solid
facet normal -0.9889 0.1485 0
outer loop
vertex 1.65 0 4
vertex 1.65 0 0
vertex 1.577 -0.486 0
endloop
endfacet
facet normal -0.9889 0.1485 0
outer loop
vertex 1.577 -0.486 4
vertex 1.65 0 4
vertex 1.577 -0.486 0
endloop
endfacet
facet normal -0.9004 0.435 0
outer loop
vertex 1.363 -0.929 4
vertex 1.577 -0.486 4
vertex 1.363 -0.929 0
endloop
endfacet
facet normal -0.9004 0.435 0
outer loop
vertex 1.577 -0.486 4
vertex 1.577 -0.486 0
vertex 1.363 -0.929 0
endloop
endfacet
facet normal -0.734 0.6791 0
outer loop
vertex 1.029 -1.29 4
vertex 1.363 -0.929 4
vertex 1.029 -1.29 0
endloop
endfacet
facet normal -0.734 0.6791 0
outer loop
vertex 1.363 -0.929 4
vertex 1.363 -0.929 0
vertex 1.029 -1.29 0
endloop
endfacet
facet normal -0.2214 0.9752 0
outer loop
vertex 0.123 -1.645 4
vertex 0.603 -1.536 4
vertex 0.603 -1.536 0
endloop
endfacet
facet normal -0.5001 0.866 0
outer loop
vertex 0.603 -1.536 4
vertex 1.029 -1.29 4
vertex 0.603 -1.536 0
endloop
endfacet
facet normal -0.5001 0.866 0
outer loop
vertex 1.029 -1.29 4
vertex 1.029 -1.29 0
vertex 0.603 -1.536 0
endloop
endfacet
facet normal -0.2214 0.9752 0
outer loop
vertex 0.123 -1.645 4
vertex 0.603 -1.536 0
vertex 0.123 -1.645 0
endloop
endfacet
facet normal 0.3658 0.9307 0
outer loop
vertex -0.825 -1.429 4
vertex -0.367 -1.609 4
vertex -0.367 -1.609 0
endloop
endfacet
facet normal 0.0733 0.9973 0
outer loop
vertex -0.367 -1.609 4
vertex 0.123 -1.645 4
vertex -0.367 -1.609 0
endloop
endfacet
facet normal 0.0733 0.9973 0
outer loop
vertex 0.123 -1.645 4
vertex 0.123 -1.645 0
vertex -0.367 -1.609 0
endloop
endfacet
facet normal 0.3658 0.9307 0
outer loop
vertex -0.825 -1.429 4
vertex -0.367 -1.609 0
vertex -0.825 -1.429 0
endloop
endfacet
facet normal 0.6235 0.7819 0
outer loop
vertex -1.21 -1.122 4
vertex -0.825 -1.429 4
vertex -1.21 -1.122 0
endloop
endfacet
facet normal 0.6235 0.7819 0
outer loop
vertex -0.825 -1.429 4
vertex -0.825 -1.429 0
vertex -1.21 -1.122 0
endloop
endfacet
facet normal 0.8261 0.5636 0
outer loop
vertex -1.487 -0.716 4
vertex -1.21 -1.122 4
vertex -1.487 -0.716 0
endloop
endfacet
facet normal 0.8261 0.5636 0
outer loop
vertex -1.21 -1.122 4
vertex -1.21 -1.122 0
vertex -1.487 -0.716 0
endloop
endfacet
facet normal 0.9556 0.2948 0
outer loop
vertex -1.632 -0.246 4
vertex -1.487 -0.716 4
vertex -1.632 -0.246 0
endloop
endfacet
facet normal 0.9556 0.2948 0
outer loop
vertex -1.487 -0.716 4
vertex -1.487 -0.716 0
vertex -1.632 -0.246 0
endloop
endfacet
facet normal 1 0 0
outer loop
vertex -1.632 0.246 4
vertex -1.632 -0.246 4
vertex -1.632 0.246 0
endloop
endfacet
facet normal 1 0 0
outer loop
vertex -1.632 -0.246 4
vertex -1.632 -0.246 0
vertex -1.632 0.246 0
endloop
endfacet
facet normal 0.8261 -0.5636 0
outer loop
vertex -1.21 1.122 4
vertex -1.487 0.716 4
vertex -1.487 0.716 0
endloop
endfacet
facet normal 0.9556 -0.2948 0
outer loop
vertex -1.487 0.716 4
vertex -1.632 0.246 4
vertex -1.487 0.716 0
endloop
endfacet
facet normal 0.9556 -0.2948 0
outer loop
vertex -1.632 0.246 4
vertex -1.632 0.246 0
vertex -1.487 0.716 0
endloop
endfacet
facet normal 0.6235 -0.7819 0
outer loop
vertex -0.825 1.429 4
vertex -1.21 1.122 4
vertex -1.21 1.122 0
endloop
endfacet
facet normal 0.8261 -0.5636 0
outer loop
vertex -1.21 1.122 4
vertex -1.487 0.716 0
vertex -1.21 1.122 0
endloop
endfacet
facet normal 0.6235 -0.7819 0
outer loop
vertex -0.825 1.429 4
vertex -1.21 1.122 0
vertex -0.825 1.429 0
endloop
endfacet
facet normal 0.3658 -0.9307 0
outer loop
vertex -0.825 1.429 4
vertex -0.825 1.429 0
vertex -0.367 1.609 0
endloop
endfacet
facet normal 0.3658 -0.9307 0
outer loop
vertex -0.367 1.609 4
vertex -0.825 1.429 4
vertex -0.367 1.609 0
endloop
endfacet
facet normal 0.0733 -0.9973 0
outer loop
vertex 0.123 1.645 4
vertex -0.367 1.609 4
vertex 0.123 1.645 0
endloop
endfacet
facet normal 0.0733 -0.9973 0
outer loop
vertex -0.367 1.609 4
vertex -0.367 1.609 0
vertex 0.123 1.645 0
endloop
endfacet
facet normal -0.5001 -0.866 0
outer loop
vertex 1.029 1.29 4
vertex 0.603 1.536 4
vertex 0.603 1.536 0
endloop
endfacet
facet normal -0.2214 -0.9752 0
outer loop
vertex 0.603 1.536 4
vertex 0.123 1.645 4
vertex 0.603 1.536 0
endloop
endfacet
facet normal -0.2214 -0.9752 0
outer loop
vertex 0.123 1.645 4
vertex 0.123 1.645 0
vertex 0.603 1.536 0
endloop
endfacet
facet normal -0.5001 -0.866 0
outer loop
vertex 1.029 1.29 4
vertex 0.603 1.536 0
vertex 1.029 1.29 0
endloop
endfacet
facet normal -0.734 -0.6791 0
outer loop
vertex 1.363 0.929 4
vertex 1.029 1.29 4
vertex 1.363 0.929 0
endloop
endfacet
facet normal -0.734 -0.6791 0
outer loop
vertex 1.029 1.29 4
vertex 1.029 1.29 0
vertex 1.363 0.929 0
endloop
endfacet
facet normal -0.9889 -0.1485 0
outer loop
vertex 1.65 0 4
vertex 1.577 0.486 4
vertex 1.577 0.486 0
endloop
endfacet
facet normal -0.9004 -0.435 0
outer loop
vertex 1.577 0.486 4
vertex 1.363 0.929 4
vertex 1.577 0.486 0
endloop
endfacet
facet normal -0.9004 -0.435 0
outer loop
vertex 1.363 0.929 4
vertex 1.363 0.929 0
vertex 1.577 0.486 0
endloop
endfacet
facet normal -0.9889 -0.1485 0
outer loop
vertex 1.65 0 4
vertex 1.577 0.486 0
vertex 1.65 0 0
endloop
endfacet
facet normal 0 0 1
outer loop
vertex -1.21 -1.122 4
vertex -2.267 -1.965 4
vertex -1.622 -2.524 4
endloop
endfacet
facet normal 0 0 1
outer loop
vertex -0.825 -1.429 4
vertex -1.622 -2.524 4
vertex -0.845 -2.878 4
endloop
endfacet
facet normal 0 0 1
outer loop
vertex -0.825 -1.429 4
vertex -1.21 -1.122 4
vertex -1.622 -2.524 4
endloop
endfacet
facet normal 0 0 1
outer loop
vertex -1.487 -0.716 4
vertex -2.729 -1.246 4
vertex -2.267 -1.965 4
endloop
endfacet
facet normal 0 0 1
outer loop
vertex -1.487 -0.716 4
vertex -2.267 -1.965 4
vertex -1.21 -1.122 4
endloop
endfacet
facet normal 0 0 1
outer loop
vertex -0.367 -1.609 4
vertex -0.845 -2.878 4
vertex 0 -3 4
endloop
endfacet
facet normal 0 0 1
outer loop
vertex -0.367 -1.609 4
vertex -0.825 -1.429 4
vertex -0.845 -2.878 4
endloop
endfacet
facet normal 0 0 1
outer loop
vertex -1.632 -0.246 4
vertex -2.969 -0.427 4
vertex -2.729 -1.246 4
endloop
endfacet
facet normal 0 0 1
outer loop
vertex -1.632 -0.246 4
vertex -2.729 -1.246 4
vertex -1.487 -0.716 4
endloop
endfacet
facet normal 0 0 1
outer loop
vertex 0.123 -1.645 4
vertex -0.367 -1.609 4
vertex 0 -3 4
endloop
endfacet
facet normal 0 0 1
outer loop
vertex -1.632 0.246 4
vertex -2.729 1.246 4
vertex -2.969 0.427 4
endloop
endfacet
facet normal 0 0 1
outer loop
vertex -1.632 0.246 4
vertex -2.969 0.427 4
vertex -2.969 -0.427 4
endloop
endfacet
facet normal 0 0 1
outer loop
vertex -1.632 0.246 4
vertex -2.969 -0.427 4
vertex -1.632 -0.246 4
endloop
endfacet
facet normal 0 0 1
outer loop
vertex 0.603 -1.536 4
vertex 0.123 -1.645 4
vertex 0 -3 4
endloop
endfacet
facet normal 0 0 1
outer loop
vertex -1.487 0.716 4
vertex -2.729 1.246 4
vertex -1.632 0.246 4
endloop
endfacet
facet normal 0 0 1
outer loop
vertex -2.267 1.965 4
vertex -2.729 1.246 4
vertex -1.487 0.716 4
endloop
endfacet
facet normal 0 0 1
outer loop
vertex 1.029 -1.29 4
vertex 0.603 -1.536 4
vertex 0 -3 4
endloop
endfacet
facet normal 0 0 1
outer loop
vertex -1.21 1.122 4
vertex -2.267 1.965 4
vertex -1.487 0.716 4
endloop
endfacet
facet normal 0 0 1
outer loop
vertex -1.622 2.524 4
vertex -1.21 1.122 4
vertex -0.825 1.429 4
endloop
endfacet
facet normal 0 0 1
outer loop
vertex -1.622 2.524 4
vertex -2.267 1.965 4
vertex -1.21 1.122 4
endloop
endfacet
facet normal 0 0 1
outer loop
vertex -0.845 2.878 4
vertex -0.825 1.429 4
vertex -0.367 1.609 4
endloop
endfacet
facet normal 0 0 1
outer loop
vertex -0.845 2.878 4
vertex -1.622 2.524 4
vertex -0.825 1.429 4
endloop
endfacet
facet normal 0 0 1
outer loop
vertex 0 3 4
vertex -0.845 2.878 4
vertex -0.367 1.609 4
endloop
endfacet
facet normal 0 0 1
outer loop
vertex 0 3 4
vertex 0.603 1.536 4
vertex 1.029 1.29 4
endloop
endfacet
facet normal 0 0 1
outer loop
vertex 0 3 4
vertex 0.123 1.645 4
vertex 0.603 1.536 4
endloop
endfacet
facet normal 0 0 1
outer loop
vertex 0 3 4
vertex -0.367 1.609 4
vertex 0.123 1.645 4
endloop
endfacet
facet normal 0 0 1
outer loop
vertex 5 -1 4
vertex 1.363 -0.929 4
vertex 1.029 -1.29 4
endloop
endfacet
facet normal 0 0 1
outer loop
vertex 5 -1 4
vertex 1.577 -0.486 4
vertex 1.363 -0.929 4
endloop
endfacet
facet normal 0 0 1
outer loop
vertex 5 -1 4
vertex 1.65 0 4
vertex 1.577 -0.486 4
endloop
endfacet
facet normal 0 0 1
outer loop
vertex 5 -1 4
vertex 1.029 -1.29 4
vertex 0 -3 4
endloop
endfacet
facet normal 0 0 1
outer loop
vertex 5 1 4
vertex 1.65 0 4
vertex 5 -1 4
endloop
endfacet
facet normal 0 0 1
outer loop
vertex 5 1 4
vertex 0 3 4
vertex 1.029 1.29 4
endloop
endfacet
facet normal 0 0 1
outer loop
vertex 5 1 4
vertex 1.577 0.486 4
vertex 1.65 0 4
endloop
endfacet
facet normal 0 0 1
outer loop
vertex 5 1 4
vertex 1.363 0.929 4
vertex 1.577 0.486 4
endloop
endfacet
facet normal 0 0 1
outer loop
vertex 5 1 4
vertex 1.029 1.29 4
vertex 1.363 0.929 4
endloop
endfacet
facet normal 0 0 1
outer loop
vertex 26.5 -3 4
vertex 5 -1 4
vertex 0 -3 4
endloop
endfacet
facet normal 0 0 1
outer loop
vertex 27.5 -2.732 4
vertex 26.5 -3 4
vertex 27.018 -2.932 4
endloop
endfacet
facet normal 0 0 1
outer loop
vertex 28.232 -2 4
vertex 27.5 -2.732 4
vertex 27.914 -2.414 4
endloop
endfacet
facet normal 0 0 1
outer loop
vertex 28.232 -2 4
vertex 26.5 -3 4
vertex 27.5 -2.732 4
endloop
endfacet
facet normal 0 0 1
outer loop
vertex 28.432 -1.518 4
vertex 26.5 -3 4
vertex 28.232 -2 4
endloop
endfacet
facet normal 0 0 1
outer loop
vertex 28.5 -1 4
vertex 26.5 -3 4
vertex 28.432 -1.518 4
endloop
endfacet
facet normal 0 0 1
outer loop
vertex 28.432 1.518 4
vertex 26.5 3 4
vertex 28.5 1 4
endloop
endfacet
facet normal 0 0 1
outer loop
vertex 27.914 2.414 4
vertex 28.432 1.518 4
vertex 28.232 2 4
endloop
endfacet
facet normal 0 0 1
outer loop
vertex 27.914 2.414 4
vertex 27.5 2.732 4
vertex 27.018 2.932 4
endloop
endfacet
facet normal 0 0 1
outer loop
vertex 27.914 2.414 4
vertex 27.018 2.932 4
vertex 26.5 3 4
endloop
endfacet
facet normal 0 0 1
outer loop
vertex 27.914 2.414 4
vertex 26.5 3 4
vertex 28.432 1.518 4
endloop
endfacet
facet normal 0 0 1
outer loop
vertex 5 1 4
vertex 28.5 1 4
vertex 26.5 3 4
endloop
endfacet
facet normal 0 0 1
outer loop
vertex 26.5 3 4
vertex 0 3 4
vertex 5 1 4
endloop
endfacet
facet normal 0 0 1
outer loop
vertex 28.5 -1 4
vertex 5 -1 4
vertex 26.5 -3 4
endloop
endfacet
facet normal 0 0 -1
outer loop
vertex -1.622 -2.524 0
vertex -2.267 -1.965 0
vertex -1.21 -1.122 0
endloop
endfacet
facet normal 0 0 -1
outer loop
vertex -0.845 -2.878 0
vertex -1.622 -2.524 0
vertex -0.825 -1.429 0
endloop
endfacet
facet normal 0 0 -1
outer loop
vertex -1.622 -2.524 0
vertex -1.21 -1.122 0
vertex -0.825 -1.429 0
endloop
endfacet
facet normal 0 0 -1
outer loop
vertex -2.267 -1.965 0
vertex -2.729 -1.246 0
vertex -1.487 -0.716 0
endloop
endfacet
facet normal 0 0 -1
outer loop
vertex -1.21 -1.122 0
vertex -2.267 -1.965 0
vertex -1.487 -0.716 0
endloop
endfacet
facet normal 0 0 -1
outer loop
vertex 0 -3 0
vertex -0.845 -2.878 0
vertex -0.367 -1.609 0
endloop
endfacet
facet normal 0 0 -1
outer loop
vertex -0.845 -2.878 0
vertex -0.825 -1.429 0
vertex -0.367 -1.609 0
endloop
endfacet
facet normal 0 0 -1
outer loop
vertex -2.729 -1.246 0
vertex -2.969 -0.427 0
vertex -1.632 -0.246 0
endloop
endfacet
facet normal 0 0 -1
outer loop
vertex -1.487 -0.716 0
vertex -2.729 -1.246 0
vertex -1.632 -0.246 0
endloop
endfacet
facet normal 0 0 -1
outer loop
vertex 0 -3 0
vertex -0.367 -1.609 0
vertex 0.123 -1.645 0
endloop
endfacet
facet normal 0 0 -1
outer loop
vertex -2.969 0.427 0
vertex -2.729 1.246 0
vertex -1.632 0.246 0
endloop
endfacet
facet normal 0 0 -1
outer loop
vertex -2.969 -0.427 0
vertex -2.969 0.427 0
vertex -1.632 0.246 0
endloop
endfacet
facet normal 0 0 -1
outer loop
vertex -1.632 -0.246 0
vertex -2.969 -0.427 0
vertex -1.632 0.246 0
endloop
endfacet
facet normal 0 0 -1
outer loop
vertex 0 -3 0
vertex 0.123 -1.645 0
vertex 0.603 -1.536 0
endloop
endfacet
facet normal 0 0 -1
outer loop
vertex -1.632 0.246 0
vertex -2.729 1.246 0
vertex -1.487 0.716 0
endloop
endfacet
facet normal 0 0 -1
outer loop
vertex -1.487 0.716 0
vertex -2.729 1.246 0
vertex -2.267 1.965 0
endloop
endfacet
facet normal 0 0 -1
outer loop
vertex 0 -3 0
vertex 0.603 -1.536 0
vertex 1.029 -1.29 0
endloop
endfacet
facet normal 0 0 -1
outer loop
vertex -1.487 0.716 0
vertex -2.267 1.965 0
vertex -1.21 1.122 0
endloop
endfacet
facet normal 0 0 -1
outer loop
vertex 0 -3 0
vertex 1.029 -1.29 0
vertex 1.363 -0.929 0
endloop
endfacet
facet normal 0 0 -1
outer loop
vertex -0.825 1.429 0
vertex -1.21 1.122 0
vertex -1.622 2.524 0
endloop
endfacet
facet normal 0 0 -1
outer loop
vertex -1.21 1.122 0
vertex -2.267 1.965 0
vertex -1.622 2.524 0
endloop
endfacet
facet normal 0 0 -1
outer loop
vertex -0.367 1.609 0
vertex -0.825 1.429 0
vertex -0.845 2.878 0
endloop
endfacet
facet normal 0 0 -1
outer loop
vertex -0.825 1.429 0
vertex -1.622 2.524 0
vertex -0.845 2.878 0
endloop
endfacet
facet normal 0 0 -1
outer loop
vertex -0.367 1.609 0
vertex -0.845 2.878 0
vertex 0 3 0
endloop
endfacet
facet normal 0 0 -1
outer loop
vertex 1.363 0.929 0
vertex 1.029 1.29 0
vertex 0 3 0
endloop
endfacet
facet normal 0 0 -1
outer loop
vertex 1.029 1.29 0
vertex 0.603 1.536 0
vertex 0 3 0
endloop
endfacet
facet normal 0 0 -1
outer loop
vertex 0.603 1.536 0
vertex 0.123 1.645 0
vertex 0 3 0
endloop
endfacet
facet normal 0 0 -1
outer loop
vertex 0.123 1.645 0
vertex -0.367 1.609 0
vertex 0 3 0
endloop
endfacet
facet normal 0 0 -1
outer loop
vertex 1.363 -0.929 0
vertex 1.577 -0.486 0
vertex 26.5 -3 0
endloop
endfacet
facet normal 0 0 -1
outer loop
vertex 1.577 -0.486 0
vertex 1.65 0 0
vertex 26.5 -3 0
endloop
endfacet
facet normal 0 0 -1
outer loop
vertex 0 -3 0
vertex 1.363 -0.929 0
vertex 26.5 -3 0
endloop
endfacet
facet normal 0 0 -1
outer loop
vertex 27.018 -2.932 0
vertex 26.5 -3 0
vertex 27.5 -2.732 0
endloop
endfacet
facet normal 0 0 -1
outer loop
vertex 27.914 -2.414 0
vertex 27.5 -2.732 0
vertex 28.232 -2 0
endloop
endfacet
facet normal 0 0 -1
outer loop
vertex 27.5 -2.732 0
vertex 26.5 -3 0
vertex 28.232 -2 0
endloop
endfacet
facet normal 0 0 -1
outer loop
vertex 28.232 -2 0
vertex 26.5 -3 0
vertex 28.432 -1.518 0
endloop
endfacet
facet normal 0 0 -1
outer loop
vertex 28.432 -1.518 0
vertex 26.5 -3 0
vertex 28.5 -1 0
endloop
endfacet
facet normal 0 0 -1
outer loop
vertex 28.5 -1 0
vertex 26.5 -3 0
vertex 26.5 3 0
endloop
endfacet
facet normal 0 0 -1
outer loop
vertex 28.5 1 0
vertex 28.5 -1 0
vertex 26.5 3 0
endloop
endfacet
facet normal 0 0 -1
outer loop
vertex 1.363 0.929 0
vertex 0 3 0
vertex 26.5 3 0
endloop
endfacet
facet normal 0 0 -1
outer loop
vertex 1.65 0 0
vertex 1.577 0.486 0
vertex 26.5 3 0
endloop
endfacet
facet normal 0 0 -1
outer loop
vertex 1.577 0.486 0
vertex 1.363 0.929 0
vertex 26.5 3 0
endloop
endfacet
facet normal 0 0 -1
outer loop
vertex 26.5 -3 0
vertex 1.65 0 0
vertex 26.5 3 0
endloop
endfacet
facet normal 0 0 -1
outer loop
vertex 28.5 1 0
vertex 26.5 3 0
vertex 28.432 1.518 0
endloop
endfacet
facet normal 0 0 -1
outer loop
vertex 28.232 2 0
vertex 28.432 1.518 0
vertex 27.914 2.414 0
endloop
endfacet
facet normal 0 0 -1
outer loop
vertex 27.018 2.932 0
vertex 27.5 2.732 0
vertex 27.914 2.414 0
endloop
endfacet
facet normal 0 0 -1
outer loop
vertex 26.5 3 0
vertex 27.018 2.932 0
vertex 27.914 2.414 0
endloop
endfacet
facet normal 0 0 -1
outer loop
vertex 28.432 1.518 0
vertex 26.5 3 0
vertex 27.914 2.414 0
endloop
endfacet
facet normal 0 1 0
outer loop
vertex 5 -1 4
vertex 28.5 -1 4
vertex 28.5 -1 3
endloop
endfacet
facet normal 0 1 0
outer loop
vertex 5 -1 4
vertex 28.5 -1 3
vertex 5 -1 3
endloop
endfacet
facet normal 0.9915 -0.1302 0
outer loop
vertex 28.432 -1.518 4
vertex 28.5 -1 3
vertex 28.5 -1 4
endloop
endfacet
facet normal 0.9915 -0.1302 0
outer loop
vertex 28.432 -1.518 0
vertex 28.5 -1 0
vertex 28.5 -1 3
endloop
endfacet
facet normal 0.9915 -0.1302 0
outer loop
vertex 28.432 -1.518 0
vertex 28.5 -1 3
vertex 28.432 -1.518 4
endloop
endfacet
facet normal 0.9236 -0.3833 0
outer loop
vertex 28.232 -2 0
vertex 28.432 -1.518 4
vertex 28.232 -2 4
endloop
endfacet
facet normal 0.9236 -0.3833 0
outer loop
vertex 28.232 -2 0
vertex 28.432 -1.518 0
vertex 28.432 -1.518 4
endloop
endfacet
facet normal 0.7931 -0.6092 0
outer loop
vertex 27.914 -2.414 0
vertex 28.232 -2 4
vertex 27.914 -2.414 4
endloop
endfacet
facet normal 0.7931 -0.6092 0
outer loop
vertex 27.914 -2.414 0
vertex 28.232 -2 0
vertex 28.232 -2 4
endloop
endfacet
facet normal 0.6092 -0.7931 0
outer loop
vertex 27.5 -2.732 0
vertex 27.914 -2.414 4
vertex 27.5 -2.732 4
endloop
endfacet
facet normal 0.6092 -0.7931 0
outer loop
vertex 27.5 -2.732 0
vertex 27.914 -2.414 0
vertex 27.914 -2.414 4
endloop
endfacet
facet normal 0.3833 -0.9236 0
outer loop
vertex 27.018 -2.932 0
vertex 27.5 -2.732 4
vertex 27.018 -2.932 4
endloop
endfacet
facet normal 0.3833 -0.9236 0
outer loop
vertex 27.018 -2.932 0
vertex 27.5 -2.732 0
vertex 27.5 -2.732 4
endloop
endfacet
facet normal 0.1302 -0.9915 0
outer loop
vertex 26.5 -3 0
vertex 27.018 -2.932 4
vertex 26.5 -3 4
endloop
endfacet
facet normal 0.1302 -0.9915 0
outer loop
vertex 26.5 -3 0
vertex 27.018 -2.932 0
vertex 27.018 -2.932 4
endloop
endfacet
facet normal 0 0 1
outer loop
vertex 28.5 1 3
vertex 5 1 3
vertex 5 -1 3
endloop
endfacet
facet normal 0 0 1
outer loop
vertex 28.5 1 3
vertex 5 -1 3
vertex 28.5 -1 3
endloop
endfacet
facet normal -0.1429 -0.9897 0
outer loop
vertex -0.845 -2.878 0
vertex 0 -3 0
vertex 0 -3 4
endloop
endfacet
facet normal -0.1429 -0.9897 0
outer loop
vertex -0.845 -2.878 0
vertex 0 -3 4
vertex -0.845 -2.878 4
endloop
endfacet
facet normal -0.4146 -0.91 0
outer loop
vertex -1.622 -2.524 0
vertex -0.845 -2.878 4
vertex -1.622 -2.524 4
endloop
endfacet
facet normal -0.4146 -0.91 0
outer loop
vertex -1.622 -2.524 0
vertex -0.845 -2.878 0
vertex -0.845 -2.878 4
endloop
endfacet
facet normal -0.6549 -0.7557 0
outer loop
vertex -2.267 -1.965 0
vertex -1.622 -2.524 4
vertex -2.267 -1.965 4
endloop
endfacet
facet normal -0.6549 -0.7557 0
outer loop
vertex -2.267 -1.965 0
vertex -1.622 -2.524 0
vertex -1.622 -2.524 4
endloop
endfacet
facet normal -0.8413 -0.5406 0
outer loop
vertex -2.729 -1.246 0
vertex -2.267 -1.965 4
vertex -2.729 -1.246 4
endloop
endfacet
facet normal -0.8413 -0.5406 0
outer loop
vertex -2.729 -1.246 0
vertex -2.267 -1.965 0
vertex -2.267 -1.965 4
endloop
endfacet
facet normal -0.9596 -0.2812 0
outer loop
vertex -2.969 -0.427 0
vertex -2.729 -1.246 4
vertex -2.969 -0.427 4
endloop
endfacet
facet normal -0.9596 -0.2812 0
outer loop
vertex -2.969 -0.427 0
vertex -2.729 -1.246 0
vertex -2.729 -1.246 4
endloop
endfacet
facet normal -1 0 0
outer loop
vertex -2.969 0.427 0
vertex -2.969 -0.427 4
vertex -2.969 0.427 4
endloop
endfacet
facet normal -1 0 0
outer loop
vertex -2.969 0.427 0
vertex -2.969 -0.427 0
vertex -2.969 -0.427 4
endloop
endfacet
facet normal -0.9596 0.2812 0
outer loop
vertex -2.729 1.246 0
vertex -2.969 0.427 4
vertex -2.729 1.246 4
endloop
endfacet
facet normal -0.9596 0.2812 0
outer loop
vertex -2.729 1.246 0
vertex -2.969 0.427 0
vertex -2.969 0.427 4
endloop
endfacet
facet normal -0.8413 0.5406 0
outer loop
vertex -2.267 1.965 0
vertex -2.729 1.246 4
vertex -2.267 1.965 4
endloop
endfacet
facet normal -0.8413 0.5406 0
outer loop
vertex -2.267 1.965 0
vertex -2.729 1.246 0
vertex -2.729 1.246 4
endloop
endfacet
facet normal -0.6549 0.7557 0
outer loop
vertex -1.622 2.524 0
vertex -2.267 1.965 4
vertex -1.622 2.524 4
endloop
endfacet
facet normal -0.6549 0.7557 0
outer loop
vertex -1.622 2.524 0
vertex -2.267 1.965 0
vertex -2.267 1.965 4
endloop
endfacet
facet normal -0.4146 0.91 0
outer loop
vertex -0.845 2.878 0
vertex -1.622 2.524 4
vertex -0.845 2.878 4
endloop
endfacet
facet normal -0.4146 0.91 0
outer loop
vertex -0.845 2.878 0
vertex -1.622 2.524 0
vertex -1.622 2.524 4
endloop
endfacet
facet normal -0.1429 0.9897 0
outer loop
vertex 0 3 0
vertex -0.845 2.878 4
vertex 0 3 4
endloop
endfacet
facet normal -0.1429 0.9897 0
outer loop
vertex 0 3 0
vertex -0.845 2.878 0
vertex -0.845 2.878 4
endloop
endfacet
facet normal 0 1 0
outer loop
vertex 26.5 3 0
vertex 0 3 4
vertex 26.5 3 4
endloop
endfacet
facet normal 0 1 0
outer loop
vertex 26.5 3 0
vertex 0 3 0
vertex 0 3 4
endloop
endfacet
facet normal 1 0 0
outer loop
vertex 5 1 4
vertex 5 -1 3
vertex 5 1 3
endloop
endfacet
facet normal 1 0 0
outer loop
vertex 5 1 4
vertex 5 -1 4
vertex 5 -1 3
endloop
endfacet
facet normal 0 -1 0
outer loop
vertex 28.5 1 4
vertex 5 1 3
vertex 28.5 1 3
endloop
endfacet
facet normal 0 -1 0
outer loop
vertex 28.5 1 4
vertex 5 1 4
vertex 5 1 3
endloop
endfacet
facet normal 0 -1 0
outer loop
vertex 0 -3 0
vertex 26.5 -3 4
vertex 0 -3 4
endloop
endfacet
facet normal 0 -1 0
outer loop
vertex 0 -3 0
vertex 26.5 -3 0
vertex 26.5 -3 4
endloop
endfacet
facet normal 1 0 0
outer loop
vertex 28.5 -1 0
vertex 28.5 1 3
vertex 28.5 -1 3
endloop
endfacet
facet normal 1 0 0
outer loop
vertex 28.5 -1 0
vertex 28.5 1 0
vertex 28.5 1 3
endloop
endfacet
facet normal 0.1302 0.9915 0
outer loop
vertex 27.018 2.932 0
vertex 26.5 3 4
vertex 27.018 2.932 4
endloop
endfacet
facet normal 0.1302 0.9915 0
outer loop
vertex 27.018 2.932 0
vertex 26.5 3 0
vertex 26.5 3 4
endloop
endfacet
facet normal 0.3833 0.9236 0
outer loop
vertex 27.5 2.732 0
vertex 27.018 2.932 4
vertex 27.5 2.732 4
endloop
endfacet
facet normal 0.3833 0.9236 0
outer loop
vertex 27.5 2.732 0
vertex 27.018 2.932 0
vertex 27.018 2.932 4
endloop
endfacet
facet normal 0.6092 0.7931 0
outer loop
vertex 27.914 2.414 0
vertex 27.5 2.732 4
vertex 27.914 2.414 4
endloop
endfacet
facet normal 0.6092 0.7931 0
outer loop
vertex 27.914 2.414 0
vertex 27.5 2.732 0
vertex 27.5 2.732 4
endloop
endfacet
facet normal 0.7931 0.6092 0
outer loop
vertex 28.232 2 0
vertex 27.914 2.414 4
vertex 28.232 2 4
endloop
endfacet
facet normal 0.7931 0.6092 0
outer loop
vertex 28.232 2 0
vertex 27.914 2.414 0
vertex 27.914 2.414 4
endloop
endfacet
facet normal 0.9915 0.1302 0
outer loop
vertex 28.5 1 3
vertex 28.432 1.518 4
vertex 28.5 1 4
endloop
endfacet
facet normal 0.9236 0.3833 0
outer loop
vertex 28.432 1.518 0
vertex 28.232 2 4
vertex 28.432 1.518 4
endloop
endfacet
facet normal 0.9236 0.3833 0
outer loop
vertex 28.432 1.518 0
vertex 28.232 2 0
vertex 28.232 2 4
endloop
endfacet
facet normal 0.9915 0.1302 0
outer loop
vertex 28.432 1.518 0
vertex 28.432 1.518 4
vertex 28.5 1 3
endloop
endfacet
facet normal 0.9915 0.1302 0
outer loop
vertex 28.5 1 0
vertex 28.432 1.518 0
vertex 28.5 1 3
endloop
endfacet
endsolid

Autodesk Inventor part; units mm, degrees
ref_plane "YZ Plane" through (0, 0, 0) normal (1, 0, 0) x (0, 1, 0)
ref_plane "XZ Plane" through (0, 0, 0) normal (0, 1, 0) x (-1, 0, 0)
ref_plane "XY Plane" through (0, 0, 0) normal (0, 0, 1) x (1, 0, 0)
sketch "Sketch1" plane through (0, 0, 0) normal (0, 0, 1) x (1, 0, 0)
  circle A0 centre (0, 0) radius 1.65
  arc A1 (0, 3) -> (0, -3) centre (0, 0) ccw
  line L0 (0, 3) -> (26.5, 3)
  line L1 (28.5, 1) -> (28.5, -1)
  line L2 (26.5, -3) -> (0, -3)
  arc A2 (28.5, 1) -> (26.5, 3) centre (26.5, 1) ccw
  arc A3 (26.5, -3) -> (28.5, -1) centre (26.5, -1) ccw
  dimension "d0" = 3.3
  dimension "d1" = 6
  dimension "d2" = 2
  dimension "d3" = 28.5
extrude "Extrusion1" add sketch "Sketch1" along normal blind 4
sketch "Sketch2" plane through (0, 0, 4) normal (0, 0, 1) x (1, 0, 0)
  line L0 (52, -1) -> (5, -1)
  line L1 (5, -1) -> (5, 1)
  line L2 (5, 1) -> (52, 1)
  line L3 (52, 1) -> (52, -1)
  line L4 (28.5, -1) -> (28.5, 1) projected
  line L5 (52, -1) -> (5, 1) construction
  line L6 (5, -1) -> (52, 1) construction
  point P0 (0, 0)
  point P1 (28.5, 0)
  point P2 (28.5, -1)
  point P3 (28.5, 1)
  dimension "d6" = 2
  dimension "d7" = 5
extrude "Extrusion2" cut sketch "Sketch2" against normal blind 1 contours L0 L1 L2 L4
properties part number "espcam-mount"
